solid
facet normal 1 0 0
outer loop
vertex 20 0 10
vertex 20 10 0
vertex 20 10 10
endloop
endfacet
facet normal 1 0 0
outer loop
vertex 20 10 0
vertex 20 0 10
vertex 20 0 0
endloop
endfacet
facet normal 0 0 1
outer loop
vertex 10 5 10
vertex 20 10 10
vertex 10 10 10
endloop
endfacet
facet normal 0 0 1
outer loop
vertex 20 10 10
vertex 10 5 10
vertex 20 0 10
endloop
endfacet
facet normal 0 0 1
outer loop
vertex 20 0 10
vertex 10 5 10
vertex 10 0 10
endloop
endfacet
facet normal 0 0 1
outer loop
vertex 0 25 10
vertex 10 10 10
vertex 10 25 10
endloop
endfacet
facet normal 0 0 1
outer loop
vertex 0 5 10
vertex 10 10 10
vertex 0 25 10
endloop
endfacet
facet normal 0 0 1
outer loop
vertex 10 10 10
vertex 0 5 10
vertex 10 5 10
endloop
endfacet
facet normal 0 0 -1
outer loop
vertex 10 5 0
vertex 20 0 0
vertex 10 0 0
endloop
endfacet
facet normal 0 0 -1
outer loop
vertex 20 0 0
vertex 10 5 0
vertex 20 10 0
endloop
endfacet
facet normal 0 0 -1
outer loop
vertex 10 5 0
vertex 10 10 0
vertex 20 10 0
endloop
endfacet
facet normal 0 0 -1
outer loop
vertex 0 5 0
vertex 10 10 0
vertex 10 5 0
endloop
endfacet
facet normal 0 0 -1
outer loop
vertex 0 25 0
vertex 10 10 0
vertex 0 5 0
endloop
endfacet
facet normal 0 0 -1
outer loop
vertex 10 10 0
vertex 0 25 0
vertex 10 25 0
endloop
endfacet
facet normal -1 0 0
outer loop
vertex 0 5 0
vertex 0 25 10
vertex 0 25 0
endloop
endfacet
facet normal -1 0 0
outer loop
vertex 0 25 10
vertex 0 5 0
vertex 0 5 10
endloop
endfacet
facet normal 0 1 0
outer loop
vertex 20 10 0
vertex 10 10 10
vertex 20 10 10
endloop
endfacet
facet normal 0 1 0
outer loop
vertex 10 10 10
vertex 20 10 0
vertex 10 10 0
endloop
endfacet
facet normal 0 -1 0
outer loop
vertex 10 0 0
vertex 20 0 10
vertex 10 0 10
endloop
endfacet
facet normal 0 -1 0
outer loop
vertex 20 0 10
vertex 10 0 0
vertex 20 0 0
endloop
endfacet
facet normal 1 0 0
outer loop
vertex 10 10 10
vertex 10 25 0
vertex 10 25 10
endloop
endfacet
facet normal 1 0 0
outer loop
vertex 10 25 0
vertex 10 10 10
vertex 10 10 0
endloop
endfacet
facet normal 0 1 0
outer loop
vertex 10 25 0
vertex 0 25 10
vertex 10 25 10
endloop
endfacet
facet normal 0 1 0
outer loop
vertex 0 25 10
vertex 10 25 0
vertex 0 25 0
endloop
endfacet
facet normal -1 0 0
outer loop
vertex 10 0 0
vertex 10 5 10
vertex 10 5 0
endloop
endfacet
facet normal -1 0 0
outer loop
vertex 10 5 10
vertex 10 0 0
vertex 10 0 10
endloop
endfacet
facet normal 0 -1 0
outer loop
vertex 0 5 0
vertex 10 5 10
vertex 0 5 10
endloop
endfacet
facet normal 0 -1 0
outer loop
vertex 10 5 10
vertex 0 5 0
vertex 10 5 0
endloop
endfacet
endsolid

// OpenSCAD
module L(){
    union(){
    cube([20,10,10]);
        cube([10,25,10]);
    }
}

difference(){
    L();
    cube([10,5,10]);
}
